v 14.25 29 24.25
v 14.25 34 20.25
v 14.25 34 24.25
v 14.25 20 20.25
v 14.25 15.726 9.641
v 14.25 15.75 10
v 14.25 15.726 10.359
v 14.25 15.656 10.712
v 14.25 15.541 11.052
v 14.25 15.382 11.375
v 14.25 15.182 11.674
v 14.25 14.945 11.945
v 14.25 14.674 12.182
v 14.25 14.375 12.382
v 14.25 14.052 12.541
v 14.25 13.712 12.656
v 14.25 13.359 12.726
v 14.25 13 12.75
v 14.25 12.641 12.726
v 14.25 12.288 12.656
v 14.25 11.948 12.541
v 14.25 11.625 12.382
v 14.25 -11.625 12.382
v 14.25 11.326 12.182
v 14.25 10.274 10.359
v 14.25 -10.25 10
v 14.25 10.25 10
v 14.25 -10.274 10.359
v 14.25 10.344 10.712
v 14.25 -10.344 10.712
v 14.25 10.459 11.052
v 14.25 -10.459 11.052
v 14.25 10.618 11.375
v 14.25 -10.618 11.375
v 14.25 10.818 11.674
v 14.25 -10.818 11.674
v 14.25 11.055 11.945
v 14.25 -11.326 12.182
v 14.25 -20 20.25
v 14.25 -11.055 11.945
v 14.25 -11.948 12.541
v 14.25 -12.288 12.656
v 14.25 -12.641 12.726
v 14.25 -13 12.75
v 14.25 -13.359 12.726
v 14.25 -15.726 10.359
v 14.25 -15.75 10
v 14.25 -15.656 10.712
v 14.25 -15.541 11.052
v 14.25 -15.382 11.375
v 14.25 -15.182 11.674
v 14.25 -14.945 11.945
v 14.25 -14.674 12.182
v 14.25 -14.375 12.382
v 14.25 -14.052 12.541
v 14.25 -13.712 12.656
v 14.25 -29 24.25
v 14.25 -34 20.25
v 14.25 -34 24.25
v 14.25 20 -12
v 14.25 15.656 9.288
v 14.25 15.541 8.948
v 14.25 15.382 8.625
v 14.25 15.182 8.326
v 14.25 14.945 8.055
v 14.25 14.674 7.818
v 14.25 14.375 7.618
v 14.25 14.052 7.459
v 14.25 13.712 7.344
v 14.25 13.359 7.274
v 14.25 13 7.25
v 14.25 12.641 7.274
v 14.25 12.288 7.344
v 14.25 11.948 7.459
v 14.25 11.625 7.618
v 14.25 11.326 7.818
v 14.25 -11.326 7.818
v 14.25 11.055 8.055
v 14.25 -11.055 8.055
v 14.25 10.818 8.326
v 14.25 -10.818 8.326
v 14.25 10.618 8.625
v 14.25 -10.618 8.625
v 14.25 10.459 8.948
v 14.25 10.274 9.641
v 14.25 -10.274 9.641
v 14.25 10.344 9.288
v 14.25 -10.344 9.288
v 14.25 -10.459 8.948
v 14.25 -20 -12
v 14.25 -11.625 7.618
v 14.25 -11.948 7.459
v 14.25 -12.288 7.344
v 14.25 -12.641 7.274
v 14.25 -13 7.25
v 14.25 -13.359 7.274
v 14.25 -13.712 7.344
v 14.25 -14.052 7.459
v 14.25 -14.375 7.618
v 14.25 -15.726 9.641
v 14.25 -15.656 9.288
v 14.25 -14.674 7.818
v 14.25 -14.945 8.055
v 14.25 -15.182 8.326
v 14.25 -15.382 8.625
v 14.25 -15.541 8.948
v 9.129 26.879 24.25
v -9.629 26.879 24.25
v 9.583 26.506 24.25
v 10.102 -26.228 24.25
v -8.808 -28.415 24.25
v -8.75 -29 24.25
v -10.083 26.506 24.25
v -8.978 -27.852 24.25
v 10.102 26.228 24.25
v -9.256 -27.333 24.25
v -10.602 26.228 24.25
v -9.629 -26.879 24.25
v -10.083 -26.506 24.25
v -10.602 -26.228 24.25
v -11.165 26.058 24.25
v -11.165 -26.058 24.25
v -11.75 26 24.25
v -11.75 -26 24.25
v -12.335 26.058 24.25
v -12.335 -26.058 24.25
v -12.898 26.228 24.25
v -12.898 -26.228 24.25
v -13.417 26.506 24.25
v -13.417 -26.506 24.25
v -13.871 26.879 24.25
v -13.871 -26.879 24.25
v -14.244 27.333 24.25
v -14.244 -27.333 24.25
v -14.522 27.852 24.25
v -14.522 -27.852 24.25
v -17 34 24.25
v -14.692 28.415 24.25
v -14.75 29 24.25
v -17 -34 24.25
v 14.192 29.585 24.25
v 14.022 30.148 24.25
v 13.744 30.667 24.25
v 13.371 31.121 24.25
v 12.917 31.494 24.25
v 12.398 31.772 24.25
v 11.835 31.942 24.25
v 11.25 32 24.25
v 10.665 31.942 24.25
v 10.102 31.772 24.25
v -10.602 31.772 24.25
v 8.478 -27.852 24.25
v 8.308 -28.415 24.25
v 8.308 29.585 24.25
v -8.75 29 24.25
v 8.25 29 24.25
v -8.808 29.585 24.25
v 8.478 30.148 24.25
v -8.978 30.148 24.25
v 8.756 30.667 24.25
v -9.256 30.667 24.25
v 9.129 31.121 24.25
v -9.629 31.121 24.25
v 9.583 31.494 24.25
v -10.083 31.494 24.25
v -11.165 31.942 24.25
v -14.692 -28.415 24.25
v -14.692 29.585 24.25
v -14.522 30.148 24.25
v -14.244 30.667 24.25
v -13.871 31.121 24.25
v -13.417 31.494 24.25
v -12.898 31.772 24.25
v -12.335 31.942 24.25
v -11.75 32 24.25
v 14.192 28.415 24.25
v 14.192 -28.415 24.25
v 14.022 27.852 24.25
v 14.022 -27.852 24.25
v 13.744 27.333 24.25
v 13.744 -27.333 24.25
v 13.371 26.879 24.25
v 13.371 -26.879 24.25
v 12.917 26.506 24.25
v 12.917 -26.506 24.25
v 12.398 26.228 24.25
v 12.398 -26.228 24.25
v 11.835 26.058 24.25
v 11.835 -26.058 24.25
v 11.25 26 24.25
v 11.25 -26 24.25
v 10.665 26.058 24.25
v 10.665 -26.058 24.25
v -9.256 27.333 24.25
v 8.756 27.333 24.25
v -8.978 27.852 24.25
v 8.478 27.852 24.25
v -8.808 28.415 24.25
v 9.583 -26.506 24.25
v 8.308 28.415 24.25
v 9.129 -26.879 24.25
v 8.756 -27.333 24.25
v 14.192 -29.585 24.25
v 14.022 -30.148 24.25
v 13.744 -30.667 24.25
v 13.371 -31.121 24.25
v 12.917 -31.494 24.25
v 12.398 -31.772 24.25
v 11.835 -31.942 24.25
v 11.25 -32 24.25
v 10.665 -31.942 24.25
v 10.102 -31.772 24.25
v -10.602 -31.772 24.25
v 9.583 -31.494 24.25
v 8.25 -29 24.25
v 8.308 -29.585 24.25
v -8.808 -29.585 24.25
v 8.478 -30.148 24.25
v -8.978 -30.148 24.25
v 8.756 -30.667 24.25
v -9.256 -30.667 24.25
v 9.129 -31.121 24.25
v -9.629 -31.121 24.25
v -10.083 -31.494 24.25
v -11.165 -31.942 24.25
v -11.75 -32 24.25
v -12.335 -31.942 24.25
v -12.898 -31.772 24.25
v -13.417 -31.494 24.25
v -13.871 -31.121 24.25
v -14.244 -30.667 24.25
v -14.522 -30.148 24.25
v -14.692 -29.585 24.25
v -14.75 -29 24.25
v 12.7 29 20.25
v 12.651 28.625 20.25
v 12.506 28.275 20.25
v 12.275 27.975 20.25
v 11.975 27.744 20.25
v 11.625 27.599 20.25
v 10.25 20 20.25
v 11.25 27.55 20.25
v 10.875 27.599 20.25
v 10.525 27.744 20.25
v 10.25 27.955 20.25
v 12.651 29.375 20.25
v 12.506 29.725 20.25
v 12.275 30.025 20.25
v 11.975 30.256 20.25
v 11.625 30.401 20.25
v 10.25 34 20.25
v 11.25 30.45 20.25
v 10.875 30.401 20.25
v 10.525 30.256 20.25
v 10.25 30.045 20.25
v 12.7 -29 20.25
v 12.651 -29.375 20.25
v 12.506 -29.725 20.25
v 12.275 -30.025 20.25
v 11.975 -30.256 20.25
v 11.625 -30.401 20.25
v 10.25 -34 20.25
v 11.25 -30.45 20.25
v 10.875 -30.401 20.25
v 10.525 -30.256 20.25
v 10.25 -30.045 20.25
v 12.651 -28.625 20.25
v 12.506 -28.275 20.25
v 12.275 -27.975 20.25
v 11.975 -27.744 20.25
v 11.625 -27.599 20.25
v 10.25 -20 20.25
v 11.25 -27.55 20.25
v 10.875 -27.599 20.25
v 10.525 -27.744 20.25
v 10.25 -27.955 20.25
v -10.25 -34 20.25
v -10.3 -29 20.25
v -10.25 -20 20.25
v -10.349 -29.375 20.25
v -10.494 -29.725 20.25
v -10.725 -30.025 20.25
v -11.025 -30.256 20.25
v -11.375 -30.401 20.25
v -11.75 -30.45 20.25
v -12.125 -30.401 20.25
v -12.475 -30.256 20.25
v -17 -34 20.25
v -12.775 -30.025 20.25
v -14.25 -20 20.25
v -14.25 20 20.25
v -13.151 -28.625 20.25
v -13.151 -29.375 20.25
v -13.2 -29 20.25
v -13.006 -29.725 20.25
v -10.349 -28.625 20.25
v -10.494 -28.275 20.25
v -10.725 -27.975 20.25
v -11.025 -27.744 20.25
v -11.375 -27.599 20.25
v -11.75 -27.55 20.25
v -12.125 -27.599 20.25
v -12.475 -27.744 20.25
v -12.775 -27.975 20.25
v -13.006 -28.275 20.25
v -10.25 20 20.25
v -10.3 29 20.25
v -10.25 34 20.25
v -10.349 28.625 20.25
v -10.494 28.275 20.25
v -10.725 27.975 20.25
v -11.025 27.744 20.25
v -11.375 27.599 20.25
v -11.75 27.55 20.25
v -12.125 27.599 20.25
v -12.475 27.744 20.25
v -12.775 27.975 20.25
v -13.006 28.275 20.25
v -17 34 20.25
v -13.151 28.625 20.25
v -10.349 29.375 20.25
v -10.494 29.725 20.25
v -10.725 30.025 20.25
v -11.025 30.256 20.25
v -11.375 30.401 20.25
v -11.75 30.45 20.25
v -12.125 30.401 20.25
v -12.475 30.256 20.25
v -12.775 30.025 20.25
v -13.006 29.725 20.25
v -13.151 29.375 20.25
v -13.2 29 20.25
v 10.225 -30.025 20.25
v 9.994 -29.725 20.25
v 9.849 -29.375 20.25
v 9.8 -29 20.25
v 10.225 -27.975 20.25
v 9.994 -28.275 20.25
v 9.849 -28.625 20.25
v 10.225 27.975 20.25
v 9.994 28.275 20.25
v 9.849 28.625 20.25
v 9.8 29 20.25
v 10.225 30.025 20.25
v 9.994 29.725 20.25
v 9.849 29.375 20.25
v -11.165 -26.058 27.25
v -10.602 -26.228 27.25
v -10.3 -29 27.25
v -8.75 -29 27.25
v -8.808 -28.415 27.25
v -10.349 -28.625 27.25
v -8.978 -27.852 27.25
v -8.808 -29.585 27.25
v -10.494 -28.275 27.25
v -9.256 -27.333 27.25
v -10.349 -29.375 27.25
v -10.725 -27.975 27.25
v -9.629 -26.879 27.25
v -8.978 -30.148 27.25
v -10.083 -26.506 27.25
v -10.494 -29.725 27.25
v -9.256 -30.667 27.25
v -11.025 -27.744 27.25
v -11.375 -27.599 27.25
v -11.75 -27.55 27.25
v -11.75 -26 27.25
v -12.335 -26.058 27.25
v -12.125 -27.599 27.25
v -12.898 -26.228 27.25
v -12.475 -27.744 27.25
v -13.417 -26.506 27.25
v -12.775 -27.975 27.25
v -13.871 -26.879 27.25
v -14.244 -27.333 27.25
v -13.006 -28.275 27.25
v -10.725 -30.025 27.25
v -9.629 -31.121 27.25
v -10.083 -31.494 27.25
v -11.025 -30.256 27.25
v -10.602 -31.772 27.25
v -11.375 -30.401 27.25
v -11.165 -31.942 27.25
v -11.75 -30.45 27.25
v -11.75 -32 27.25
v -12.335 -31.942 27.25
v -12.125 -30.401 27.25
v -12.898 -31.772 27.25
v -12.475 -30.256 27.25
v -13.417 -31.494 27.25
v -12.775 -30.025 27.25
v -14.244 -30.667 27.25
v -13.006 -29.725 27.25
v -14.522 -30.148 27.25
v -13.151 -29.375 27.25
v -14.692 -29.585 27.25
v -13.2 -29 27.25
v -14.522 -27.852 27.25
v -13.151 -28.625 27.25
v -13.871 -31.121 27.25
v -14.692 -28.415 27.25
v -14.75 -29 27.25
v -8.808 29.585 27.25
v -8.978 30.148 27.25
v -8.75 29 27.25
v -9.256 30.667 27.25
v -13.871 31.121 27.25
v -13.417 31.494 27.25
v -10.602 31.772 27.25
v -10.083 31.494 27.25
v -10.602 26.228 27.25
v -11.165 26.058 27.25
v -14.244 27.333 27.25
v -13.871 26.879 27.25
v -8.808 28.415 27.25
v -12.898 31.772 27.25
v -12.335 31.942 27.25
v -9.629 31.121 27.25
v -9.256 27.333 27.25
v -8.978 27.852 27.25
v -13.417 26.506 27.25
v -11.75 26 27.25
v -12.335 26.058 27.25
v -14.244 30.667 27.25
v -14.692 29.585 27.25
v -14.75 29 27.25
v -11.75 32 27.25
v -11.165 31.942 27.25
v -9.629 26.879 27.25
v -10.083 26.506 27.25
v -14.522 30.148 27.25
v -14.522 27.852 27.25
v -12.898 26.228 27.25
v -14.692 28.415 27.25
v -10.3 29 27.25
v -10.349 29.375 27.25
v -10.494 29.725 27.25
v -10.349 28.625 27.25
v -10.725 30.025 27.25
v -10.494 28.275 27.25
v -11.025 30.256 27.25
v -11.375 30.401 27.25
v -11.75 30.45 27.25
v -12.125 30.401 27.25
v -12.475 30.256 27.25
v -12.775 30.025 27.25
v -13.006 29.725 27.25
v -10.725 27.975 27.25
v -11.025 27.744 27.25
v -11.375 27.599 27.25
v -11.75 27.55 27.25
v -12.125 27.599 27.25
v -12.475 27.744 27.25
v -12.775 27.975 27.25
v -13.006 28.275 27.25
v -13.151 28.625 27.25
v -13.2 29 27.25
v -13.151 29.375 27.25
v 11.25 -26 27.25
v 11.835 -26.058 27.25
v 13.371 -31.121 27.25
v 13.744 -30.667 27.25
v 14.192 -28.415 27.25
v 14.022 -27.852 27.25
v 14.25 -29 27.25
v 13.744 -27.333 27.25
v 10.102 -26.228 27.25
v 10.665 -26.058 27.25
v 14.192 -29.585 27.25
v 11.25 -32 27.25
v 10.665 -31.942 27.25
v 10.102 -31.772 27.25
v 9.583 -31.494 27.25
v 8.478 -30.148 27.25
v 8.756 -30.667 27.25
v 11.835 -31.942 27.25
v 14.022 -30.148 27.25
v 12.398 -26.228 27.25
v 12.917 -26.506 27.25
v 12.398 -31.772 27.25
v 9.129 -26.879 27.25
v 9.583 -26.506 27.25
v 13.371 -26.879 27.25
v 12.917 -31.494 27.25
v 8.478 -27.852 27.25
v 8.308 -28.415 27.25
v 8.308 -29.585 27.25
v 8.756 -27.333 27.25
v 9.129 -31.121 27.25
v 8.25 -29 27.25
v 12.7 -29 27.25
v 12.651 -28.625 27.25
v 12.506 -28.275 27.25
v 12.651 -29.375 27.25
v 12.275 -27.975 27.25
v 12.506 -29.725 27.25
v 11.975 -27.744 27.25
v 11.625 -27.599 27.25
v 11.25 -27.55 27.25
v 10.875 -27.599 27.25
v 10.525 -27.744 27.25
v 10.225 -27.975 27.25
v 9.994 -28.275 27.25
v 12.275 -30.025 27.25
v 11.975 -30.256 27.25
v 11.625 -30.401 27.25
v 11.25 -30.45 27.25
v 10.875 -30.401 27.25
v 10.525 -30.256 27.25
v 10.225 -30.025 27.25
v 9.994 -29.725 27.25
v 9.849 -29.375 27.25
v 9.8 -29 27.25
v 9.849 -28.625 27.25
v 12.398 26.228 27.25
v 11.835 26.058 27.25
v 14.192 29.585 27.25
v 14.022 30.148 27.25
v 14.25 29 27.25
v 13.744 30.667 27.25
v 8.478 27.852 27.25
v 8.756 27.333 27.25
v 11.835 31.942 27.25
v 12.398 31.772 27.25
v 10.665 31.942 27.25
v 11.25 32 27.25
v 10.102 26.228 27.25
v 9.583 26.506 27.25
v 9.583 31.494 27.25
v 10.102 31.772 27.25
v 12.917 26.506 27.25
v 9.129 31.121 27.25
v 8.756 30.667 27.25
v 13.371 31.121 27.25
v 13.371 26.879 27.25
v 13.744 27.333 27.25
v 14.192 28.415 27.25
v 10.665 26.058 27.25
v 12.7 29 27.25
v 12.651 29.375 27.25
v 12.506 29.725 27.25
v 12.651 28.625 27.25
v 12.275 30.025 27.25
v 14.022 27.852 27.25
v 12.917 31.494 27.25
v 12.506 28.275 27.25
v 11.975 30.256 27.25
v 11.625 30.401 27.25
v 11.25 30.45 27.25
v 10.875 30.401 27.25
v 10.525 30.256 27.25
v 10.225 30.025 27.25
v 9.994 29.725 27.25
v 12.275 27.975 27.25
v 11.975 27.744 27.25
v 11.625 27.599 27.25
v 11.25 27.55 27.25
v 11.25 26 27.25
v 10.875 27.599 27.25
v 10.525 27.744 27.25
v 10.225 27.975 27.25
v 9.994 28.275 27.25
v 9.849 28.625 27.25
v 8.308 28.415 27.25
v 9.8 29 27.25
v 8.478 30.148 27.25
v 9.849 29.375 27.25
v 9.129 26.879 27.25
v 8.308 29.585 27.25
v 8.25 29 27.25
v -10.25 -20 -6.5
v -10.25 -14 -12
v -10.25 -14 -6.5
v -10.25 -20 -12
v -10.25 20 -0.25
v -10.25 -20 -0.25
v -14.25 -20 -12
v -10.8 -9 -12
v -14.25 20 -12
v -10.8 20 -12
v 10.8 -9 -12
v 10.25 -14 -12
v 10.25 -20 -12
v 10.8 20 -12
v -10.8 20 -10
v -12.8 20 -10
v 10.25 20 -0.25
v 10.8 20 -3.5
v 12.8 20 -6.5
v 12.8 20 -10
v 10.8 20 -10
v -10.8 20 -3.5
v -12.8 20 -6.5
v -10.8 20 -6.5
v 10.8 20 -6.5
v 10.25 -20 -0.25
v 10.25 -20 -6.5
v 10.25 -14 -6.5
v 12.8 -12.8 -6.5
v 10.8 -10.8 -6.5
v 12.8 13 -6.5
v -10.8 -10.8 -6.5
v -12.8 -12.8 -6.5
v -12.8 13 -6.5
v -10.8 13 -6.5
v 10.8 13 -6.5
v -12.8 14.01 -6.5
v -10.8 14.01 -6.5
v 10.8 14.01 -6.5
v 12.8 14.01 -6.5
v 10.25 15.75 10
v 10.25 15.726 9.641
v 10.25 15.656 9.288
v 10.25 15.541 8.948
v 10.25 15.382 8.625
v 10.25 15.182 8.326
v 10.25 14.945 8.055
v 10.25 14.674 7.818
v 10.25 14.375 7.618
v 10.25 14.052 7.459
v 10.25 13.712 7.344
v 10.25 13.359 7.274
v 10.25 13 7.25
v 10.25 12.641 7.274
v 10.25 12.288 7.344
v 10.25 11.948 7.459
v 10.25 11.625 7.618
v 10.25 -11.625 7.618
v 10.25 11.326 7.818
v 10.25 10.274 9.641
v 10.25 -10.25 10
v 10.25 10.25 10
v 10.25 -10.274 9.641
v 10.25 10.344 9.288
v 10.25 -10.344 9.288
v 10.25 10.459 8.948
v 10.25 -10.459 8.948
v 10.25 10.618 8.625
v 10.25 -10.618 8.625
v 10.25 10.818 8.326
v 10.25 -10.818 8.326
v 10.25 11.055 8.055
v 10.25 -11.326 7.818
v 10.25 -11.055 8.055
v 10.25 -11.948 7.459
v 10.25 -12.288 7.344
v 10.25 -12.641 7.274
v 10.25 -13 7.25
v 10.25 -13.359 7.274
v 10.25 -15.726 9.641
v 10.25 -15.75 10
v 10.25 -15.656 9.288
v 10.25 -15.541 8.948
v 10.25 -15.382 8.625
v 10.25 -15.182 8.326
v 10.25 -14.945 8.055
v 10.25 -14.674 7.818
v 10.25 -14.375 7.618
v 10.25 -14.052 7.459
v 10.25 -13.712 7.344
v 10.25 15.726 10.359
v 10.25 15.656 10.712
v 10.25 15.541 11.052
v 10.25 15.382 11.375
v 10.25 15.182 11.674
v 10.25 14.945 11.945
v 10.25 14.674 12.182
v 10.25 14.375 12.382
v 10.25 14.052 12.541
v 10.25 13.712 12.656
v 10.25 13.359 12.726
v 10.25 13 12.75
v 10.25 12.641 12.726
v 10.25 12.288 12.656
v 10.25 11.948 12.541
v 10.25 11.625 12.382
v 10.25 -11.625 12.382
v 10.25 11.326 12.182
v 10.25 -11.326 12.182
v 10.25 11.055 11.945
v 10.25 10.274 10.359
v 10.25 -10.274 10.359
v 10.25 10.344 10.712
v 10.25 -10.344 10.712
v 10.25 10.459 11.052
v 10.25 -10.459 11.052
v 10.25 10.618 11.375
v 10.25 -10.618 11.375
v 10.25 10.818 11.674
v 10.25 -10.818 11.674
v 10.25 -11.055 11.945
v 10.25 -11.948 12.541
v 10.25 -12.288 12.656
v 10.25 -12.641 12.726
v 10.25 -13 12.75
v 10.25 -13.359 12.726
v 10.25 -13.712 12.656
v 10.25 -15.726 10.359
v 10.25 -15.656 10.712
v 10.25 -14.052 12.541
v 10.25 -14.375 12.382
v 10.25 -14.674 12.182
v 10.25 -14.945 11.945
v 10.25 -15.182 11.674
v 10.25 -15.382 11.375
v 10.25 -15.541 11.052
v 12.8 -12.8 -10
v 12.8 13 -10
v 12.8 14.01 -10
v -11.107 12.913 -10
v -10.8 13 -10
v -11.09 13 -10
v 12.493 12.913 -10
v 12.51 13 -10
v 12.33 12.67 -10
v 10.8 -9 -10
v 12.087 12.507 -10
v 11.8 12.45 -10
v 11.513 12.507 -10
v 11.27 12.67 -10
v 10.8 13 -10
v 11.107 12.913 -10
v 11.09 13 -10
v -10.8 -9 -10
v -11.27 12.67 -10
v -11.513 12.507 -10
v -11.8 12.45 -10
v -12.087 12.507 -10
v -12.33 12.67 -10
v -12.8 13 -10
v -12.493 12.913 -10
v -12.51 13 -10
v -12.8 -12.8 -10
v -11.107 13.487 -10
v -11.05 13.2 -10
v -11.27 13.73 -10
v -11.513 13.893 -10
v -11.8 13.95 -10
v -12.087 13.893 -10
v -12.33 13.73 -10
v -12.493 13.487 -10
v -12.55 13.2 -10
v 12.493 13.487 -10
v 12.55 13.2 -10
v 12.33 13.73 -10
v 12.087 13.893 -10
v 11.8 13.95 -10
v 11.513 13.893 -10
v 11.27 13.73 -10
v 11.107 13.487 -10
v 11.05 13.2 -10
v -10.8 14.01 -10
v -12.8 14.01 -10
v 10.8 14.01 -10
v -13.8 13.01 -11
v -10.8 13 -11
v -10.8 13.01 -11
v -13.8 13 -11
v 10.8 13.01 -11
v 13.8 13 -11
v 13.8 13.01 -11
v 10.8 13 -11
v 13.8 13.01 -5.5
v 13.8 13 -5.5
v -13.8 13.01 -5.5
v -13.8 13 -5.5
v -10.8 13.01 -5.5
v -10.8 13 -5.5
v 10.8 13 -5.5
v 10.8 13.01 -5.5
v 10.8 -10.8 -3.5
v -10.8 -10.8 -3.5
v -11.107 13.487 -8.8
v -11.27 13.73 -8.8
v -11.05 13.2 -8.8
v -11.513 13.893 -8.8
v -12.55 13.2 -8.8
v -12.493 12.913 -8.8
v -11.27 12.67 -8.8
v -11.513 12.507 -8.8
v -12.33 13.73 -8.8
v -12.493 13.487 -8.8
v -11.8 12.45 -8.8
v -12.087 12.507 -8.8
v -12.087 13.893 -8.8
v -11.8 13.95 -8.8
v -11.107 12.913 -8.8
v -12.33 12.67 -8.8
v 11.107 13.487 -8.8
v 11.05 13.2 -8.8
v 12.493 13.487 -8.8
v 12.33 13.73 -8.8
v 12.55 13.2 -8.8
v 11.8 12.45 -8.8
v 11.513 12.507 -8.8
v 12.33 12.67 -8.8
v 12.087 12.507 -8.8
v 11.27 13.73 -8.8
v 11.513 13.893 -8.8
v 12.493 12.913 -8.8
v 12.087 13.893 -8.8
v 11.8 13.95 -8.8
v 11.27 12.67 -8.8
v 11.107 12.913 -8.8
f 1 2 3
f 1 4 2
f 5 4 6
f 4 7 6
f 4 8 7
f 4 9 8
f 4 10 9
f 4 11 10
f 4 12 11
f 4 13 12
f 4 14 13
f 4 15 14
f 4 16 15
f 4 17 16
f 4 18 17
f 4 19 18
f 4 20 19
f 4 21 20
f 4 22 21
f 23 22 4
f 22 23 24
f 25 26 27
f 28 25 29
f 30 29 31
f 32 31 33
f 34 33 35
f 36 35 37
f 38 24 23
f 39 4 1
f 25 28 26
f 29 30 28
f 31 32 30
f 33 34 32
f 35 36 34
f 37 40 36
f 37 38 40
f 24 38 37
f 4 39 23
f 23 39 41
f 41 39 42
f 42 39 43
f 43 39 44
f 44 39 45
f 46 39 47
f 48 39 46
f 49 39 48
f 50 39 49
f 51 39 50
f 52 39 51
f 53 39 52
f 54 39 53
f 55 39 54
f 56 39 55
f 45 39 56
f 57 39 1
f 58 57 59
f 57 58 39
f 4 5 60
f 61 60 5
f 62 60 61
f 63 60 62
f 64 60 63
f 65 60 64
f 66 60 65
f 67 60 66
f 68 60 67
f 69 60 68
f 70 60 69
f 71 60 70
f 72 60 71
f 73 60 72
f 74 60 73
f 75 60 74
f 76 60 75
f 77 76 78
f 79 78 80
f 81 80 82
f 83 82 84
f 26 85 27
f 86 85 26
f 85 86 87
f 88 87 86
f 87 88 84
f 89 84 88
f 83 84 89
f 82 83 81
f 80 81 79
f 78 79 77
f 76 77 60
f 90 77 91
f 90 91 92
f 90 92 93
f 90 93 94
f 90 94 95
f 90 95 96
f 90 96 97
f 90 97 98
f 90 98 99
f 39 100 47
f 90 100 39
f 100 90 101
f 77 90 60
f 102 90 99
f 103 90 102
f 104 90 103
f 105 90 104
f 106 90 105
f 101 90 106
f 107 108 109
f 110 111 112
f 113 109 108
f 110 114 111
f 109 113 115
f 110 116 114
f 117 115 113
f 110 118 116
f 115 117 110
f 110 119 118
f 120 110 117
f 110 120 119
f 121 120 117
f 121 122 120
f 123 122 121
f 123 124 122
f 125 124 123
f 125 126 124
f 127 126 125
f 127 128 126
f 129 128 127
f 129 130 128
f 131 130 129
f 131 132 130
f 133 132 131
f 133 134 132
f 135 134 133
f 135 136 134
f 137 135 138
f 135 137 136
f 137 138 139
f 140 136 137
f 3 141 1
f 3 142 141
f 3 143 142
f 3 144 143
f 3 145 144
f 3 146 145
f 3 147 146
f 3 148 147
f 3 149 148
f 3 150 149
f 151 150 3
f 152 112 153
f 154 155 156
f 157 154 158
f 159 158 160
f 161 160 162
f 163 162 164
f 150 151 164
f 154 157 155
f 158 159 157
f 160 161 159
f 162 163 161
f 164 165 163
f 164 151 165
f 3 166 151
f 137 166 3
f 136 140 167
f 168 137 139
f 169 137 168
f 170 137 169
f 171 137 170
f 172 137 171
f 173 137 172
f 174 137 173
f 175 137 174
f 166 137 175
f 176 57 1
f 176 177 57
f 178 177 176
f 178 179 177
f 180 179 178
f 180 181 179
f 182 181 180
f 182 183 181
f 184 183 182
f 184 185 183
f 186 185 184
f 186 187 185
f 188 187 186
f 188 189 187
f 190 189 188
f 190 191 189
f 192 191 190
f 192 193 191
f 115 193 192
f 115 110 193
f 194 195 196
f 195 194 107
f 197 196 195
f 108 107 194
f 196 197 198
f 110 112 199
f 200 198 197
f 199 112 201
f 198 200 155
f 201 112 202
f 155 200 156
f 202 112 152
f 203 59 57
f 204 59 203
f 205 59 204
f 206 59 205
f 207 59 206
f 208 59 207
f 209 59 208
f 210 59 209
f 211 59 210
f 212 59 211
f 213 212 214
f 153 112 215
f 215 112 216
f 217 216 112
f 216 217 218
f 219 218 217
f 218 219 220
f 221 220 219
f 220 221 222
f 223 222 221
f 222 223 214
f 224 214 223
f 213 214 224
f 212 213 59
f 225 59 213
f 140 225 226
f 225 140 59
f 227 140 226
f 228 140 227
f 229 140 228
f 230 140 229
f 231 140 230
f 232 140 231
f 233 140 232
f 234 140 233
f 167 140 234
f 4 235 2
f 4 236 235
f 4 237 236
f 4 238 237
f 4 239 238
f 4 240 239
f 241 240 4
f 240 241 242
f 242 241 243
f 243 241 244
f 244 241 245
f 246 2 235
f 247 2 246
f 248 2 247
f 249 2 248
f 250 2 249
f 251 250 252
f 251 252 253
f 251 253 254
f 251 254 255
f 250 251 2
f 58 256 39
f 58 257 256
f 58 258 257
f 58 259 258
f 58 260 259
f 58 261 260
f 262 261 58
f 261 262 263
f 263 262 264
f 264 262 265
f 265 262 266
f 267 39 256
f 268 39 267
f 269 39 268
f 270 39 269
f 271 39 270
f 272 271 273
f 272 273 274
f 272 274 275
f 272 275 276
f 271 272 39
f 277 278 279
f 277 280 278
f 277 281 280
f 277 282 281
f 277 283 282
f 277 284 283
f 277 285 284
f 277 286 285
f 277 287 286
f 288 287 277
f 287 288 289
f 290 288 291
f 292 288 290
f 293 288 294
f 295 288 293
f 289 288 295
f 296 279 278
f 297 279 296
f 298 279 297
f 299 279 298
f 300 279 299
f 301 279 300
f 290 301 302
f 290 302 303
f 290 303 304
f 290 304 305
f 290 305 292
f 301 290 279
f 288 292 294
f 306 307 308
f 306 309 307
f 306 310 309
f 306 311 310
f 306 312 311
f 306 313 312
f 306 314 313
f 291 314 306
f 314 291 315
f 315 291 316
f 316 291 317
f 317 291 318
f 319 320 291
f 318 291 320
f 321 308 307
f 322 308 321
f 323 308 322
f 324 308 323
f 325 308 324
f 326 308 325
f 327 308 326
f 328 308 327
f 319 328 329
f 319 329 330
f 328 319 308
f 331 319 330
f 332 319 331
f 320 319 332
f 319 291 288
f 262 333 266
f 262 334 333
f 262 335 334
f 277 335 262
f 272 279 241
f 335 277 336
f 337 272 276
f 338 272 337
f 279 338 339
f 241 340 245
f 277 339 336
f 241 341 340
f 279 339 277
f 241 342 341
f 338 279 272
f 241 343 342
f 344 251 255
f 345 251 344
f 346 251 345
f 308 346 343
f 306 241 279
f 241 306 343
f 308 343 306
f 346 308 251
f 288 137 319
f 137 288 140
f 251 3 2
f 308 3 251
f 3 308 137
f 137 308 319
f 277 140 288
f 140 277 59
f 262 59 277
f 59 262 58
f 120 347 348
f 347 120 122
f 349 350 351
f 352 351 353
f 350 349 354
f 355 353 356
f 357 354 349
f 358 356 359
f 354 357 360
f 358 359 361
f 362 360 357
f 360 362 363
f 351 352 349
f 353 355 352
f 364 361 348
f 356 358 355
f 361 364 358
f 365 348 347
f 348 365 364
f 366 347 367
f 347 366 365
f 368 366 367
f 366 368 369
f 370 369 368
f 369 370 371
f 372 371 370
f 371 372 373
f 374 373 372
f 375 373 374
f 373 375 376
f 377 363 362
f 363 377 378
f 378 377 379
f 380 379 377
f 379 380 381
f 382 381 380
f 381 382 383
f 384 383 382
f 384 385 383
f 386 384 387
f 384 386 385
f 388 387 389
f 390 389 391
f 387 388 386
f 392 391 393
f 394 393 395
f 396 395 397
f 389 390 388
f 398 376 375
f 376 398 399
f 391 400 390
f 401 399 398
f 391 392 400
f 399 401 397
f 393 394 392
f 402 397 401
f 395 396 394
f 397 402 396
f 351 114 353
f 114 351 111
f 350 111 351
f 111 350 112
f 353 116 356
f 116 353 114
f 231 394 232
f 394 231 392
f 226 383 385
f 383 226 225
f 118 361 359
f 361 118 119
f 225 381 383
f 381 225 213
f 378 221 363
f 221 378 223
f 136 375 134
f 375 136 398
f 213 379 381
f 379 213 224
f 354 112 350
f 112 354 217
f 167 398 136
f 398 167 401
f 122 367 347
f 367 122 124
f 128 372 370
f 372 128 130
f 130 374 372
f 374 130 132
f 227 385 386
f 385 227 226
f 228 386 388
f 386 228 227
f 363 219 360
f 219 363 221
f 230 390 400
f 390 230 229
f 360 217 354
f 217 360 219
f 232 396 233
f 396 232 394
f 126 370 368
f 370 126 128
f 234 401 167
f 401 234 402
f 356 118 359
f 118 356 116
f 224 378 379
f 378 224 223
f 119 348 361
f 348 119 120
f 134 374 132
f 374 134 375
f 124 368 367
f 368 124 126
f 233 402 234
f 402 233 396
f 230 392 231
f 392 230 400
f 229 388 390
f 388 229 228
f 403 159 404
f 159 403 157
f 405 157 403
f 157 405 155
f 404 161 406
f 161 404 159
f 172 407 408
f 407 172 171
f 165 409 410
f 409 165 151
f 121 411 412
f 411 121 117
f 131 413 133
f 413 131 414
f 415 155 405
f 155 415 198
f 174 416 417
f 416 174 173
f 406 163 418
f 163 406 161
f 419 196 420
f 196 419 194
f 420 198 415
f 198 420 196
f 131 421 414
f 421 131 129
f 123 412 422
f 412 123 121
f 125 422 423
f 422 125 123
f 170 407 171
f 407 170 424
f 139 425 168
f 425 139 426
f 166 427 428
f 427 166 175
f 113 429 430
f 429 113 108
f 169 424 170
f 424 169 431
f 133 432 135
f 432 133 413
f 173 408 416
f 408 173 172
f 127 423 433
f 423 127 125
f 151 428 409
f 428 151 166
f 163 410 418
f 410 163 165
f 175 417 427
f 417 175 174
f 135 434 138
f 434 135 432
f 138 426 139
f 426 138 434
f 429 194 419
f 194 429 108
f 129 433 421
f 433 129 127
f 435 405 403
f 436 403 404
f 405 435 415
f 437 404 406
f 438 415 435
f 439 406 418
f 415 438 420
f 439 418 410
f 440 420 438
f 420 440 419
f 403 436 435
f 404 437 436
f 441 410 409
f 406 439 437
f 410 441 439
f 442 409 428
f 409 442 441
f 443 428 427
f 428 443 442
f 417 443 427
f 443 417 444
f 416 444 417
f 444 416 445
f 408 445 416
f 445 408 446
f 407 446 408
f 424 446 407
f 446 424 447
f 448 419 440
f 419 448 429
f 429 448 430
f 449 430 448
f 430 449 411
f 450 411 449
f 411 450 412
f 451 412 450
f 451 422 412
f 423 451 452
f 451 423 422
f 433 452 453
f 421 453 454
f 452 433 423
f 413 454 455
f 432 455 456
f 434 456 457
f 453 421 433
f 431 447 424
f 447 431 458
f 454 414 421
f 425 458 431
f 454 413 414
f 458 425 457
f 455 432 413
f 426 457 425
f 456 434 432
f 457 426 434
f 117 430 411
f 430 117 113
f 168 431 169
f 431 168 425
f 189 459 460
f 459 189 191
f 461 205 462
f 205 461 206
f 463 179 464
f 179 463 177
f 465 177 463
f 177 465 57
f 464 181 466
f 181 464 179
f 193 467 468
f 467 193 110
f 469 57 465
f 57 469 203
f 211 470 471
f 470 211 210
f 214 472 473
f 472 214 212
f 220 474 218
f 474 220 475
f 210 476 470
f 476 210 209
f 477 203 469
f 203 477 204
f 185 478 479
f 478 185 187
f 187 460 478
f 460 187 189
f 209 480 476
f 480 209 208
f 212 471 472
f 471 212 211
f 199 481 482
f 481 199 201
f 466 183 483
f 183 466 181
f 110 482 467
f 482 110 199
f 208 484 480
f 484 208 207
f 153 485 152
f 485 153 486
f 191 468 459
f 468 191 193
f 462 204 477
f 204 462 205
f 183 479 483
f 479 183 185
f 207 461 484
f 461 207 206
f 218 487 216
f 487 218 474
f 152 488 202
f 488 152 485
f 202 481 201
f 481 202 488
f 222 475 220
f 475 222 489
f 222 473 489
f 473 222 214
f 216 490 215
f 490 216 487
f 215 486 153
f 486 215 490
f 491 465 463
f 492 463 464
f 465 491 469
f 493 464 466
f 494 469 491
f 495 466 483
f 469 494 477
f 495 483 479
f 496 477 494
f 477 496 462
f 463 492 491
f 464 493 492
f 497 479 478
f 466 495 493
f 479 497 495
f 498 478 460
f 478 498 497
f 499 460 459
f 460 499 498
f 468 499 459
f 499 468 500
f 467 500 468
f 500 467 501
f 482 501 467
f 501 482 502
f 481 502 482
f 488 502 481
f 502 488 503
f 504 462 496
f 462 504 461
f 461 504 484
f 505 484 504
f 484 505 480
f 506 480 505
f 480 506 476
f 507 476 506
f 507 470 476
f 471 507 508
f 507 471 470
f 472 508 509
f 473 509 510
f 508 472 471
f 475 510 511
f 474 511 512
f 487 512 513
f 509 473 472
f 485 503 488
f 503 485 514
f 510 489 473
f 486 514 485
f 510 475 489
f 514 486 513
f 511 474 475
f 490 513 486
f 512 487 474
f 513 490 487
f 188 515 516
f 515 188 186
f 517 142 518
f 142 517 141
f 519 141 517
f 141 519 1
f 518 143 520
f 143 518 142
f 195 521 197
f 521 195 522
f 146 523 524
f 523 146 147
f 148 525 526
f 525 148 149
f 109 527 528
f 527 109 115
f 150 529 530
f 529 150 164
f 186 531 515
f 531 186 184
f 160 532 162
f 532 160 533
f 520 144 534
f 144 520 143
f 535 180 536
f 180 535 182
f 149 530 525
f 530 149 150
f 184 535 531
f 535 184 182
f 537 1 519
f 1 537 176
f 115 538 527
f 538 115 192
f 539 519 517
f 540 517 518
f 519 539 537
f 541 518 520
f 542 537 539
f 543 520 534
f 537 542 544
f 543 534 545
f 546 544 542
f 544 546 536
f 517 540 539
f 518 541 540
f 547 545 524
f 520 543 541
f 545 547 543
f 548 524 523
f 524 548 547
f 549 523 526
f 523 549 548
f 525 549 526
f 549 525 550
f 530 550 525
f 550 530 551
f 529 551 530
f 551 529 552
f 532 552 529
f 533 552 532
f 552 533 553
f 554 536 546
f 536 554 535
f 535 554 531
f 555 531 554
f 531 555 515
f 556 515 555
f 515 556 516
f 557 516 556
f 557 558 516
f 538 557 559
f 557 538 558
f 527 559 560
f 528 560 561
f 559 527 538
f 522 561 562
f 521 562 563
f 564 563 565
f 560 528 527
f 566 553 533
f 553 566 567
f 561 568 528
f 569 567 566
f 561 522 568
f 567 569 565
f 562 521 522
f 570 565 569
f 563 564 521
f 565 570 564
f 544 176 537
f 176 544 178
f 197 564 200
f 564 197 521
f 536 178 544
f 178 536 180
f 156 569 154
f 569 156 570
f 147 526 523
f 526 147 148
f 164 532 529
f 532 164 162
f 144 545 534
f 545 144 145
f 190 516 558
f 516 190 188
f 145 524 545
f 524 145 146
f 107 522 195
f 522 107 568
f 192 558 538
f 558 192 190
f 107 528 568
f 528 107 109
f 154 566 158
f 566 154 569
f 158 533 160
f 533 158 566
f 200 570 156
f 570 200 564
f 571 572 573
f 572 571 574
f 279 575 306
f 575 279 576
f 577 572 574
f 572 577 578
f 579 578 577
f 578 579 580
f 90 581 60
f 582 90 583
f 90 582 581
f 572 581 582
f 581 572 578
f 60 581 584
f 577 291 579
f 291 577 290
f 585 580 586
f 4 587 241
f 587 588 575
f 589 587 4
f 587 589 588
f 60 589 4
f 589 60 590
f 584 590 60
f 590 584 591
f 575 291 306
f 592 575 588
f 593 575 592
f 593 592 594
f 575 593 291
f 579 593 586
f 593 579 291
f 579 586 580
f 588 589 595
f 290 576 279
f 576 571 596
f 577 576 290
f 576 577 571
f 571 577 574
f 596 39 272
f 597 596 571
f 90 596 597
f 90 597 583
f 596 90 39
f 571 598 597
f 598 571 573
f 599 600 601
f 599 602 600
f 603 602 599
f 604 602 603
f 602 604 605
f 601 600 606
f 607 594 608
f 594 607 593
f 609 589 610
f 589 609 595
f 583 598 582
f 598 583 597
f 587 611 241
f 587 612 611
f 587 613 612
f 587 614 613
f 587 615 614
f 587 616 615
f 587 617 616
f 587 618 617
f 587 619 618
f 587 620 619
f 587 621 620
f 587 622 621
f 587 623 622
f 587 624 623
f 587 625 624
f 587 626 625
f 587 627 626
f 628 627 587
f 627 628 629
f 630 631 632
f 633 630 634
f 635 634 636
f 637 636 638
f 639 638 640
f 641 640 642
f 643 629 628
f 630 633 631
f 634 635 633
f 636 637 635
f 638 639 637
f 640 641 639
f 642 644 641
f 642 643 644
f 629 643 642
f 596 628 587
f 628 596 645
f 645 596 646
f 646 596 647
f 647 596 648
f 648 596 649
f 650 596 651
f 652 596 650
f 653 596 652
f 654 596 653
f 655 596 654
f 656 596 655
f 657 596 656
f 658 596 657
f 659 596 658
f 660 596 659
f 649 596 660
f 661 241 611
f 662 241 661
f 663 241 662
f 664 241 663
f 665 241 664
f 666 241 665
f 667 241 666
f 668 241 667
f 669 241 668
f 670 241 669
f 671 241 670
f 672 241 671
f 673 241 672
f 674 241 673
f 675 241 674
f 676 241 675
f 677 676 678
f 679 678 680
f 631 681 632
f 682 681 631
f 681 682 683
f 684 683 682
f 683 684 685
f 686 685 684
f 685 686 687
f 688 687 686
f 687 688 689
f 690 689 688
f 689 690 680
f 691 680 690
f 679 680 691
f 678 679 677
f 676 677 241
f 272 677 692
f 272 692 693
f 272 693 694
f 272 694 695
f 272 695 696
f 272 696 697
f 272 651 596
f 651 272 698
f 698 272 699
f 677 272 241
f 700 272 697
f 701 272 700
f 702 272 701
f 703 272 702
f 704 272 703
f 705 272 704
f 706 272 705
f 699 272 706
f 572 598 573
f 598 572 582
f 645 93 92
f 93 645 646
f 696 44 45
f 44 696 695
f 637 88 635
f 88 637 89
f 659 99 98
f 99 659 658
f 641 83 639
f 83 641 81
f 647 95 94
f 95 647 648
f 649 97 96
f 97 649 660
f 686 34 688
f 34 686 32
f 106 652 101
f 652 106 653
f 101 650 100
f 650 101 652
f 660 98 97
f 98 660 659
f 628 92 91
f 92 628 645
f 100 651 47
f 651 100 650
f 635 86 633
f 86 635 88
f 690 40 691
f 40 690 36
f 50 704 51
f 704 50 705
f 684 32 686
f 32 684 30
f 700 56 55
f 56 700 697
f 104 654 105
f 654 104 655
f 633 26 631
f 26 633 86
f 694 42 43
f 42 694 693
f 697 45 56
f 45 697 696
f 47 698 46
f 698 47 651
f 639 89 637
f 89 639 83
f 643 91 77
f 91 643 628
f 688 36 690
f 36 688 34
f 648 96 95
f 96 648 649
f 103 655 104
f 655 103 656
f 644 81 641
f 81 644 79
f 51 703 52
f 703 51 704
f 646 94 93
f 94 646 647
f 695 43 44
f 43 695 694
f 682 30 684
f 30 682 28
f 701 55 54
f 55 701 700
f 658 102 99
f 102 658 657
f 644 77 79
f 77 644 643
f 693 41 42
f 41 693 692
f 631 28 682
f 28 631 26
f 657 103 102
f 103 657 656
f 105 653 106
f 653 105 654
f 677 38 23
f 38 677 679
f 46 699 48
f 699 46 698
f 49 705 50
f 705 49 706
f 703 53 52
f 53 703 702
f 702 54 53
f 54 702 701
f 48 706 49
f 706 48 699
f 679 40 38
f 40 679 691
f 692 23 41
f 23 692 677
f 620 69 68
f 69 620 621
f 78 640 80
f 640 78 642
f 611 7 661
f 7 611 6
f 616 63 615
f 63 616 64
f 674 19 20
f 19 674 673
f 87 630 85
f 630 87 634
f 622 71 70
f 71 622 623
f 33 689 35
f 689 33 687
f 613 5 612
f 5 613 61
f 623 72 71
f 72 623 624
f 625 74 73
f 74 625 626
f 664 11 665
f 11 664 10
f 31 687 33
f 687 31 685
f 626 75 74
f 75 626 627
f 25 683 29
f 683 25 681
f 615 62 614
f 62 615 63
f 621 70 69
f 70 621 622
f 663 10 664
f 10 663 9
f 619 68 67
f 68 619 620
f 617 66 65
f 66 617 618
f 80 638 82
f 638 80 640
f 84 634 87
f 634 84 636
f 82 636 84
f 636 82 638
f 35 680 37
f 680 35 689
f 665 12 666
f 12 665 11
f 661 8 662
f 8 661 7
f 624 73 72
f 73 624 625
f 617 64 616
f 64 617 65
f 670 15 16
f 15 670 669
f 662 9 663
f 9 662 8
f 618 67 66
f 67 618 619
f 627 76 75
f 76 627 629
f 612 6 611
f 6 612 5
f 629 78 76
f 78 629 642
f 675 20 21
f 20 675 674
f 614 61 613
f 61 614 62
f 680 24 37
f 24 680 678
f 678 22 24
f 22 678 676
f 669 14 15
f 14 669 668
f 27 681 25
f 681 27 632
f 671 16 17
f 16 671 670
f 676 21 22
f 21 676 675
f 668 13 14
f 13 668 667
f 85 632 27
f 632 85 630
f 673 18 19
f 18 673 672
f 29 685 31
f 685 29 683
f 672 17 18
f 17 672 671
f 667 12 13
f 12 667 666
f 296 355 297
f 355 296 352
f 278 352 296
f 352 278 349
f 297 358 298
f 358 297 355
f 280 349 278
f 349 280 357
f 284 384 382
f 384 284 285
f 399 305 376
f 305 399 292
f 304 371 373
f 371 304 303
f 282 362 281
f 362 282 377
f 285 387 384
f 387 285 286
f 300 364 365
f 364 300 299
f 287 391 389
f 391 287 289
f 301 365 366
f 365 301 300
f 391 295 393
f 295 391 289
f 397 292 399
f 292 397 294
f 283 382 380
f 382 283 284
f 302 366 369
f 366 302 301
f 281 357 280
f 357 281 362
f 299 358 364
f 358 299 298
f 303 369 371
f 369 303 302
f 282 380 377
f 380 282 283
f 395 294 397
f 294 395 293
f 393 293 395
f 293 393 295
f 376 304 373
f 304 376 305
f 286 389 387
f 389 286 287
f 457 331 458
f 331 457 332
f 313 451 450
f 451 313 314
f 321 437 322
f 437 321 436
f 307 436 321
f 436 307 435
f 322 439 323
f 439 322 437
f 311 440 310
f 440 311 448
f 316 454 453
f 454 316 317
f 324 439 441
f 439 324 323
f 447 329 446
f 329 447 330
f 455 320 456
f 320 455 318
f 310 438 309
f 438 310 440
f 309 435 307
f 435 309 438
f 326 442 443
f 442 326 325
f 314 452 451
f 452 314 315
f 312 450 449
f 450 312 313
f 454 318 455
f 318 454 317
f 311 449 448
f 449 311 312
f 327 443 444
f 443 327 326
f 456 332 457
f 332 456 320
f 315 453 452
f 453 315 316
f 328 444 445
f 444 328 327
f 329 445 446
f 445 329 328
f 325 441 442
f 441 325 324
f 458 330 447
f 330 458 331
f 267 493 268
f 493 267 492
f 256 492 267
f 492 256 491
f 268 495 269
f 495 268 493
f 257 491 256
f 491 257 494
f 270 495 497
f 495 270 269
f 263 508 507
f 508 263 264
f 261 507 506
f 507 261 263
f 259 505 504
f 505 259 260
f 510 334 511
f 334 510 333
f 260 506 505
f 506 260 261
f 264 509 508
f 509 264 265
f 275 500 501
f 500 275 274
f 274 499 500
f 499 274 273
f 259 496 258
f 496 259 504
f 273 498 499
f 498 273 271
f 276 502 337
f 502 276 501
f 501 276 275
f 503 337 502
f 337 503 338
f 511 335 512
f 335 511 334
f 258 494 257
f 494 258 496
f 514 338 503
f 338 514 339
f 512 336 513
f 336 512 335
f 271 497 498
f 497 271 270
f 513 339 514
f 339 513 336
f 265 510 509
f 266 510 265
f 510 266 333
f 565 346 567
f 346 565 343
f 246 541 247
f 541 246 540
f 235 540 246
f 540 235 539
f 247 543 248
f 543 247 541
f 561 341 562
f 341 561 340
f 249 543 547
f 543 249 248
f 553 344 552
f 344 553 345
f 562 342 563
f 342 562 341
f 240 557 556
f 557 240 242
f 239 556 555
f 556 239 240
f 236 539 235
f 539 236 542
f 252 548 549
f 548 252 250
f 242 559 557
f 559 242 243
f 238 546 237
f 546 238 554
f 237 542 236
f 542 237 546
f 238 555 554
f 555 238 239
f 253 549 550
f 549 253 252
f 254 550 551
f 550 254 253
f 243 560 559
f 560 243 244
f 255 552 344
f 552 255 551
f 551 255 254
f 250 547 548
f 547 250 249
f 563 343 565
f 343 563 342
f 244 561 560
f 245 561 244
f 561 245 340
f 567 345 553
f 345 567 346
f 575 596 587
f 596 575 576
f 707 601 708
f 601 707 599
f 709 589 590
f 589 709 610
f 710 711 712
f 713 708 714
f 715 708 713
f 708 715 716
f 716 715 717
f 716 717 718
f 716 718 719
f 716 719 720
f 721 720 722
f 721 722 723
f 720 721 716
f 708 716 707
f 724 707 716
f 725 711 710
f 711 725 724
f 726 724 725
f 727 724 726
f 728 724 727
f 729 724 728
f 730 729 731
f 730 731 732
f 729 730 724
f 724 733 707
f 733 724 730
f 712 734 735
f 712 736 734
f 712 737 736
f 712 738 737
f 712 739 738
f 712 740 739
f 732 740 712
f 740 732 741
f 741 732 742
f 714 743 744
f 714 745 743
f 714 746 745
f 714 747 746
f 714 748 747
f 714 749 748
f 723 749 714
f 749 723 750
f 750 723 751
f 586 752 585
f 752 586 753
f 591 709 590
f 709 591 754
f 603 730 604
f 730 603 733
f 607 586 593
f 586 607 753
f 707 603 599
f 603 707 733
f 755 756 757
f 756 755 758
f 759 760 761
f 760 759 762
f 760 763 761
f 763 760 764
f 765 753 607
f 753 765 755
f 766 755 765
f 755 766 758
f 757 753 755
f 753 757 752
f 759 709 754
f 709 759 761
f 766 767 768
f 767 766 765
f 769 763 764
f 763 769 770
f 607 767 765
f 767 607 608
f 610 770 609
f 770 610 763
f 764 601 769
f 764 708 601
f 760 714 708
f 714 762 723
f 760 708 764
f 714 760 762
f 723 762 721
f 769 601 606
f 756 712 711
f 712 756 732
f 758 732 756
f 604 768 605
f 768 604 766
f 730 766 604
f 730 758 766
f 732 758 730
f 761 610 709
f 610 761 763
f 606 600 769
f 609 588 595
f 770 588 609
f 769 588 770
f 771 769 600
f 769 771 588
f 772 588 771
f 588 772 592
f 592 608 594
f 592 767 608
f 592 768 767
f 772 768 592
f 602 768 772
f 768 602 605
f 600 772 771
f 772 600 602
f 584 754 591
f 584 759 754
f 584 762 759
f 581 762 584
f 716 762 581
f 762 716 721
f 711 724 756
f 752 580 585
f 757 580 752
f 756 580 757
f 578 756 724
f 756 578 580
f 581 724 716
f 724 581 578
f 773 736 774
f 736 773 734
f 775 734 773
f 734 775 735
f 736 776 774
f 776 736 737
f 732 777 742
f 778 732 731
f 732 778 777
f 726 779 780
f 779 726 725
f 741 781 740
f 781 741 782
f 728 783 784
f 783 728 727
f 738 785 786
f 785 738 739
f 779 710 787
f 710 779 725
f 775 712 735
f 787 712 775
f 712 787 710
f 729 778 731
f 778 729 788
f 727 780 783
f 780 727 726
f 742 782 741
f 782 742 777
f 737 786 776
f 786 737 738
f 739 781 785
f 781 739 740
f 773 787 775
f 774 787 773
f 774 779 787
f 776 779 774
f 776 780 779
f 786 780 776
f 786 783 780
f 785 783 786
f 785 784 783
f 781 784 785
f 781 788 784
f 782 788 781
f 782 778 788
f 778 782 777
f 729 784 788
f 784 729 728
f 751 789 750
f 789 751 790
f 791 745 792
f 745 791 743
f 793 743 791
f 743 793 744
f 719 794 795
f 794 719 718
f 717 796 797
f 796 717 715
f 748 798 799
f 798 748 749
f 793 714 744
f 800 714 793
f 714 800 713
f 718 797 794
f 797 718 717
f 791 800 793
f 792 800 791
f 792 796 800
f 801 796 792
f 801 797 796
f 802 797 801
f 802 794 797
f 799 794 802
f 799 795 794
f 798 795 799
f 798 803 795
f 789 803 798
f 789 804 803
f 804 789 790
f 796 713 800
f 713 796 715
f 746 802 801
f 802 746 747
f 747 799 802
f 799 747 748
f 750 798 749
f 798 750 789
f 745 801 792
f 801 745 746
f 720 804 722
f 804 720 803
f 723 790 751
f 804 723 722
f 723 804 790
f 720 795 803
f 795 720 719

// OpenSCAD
// file: common-2020.scad
// Shared socket geometry for the scanner stand brackets.
// A socket holds the end of a 2020 profile running down -Z from its closed end at z=0.

$fn = 48;

profile     = 20;
clearance   = 0.25;   // per side; raise if the profile will not slide in
wall        = 4;
depth       = 30;     // how far a profile slides into a socket
screw_d     = 5.5;
screw_depth = [9, 22];

inner = profile + 2 * clearance;
outer = inner + 2 * wall;
far   = 400;          // long enough to clear anything a hull adds in a profile's path

module socket_body() translate([-outer / 2, -outer / 2, -depth]) cube([outer, outer, depth + wall]);

module socket_void() translate([-inner / 2, -inner / 2, -far]) cube([inner, inner, far]);

// M5 holes through the front and back walls, into T-nuts in the profile's slots.
module socket_screws(depths = screw_depth)
    for (d = depths)
        translate([0, 0, -d]) rotate([90, 0, 0]) cylinder(d = screw_d, h = outer + 2, center = true);
// file: pi-camera-bracket.scad
// One-piece mount for the Pi and the camera on the cross bar of the triangle stand.
// A C that wraps the bar: the Pi Zero screws onto the plate on top, the camera board
// slides into the slot underneath, looking down through the window, on the bar's
// centre line. The open side leaves room for the ribbon cable to run from the camera
// up to the Pi, and lets the mount come off the bar without taking the frame apart.
//
// The boards are held directly, so the cases from thingiverse:2615180 are not needed.
// Board sizes are the published ones for a Pi Zero and a Pi camera module; check them
// against yours, and change pi_holes / cam_board / board_t if they differ.
//
// Hardware: 2x M5x10 button head + 2x M5 T-nuts (slot 6) into the bar's side slot,
// 4x M3x6 self-tapping into the posts for the Pi.
// Print standing on its back, the face with the two M5 holes; PETG, 4+ walls,
// 40% infill, no supports.

include <common-2020.scad>

// Bar runs along Y with its bottom face at z=0. The mount grips its +X side.
back      = inner / 2 + wall;      // outer face of the part against the bar's side
top_z     = profile + clearance;   // underside of the plate over the bar

// Pi Zero: 65 x 30 board, holes 58 x 23 apart; M3 screws go through them.
// pi4-camera-bracket.scad sets these for a Pi 4 and reuses everything else.
pi_board  = [30, 65];
pi_tilt   = 0;                // degrees the Pi leans up toward the open side; see
                              // pi4-camera-bracket-tilted.scad
pi_holes  = [23, 58];
post_h    = 3;
post_d    = 6;
post_hole = 2.9;              // for M3 self-tapping; printed holes come out ~0.3 mm small
// Centre of the holes, across the bar: on the bar's centre line, unless that puts
// a post out past the back face the part stands on to print.
pi_x      = min(0, back - post_d / 2 - pi_holes[0] / 2);
plate     = [[-17, back], [-34, 34]];

// Camera board: 25 x 25 as measured, lens looking down through the window.
// The window runs out to the way in as a channel, so the lens barrel and whatever
// else stands out of the board's underside slide along it instead of hitting the floor.
// The board lies on the floor of the slot under its own weight, so slack above it
// costs nothing but makes it go in.
board     = [25, 25];
cam_board = board + [0.6, 0.6]; // the slot: 0.3 mm of play on each side, so the
                            // board goes in without room to rattle; in along +Y
board_t   = 3.5;            // board, plus what is soldered within reach of the lips
window    = [21.6, 18];     // what the camera looks through, and the channel's width;
                            // what is left either side is the 2 mm ledge the board rests on
lead_in   = 1;              // funnel at the mouth of the slot; at most `rim`
tray_z    = -12;            // underside of the tray
floor_t   = 2;
rim       = 1.2;            // material around the slot, beside it and behind it
lip       = 2;              // how far the lips reach in over the board's edges
bump      = 1.2;            // stops the board sliding back out

// The tray keeps `rim` of wall on the back side too, sitting over if the slot is
// wider than the room between the bar's side and the back of this part. The block
// is then the slot plus a rim each side, which is what makes it 28 mm across.
cam_x     = min(0, -(cam_board[0] / 2 + rim - back));

web_y     = 20;
closed    = false;          // a fourth wall on the open side: a ring the bar has to be
                            // pushed through; see pi-camera-bracket-closed.scad
bar_screws = [-13, 13];

slot_z    = tray_z + floor_t;

module plate() translate([plate[0][0], plate[1][0], top_z])
    cube([plate[0][1] - plate[0][0], plate[1][1] - plate[1][0], wall]);

// What sits on the bar: the plate's width over it, which stays flat however the
// Pi leans.
module roof() translate([-outer / 2, plate[1][0], top_z])
    cube([back + outer / 2, plate[1][1] - plate[1][0], wall]);

// The Pi's plate, leaned up by pi_tilt about its top edge along the back face.
// At no tilt this changes nothing.
module pi_frame() translate([back, 0, top_z + wall]) rotate([0, pi_tilt, 0])
    translate([-back, 0, -(top_z + wall)]) children();

// The leaned plate, and a wedge filling in under it over the bar.
module pi_plate() {
    pi_frame() plate();
    hull() { roof(); pi_frame() roof(); }
}

// Sunk half a millimetre into the plate rather than standing on it: once leaned,
// faces that only touch no longer quite meet, and the union leaves a seam.
module posts() pi_frame() for (x = [-1, 1], y = [-1, 1])
    translate([pi_x + x * pi_holes[0] / 2, y * pi_holes[1] / 2, top_z + wall - 0.5])
        cylinder(d = post_d, h = post_h + 0.5, $fn = 32);

module web() translate([inner / 2, -web_y, tray_z]) cube([wall, 2 * web_y, top_z + wall - tray_z]);

// The same wall on the open side, closing the C into a ring round the bar, and the
// gap under the bar filled down to the camera block, so the bar has the same
// clearance underneath as on its other three sides.
module side_wall() {
    translate([-inner / 2 - wall, -web_y, tray_z])
        cube([wall, 2 * web_y, top_z + wall - tray_z]);
    translate([-inner / 2 - wall, -web_y, tray_z + floor_t + board_t])
        cube([inner + 2 * wall, 2 * web_y, -(tray_z + floor_t + board_t)]);
}

module tray() translate([cam_x - cam_board[0] / 2 - rim, -cam_board[1] / 2 - rim, tray_z])
    cube([cam_board[0] / 2 + rim + back - cam_x, cam_board[1] + 2 * rim,
          floor_t + board_t + lip]);

difference() {
    union() { pi_plate(); posts(); web(); tray(); if (closed) side_wall(); }

    // the bar itself, and the slot the camera board slides into
    // Open on the far side, unless the ring is closed: then only the bar's own size,
    // with clearance underneath as well.
    open_to = closed ? inner / 2 : far;
    below   = closed ? clearance : 0;
    translate([-open_to, -far, -below]) cube([open_to + inner / 2, 2 * far, top_z + below]);
    translate([cam_x - cam_board[0] / 2, -cam_board[1] / 2, slot_z])
        cube([cam_board[0], far, board_t]);
    hull() for (d = [0, lead_in])
        translate([cam_x - cam_board[0] / 2 - d, cam_board[1] / 2 + rim - d, slot_z - d])
            cube([cam_board[0] + 2 * d, 0.01, board_t + 2 * d]);
    // over the board: open, apart from a lip along each side
    translate([cam_x - cam_board[0] / 2 + lip, -cam_board[1] / 2 + lip, slot_z + board_t])
        cube([cam_board[0] - 2 * lip, far, lip + 1]);
    // what the camera looks through
    translate([cam_x - window[0] / 2, -window[1] / 2, tray_z - 1])
        cube([window[0], far, floor_t + 2]);

    for (y = bar_screws) translate([inner / 2 - 1, y, profile / 2]) rotate([0, 90, 0]) cylinder(d = screw_d, h = wall + 2);
    pi_frame() for (x = [-1, 1], y = [-1, 1])
        translate([pi_x + x * pi_holes[0] / 2, y * pi_holes[1] / 2, top_z - 1])
            cylinder(d = post_hole, h = wall + post_h + 2, $fn = 24);
}

// A bump on each ledge, just behind the board's back edge once it is all the way in,
// to keep it from sliding out. The board rides over them on the way in.
for (x = [-1, 1])
    translate([cam_x + x * (cam_board[0] + window[0]) / 4, -cam_board[1] / 2 + board[1] + 1, slot_z])
        cylinder(d = 1.5, h = bump, $fn = 16);   // narrower than the ledge it sits on
// main file
// The Pi Zero mount from pi-camera-bracket.scad, closed into a ring round the bar.
// Instead of clamping onto the bar's side it goes on over the end of the bar, before
// the apex brackets are fitted, and slides along it to the middle.
//
// The ribbon cable leaves the camera slot through its mouth, along the bar, and
// comes up to the Pi past the end of the ring.
//
// Hardware: 4x M3x6 self-tapping for the Pi. The two M5 holes stay: with an M5x10
// and a T-nut in the bar's side slot they stop the ring sliding once it is placed.
// Print standing on its back, the face with the two M5 holes; PETG, 4+ walls,
// 40% infill. The new wall bridges 20 mm over the bar's tunnel, which PETG manages
// without supports.

include <pi-camera-bracket.scad>

closed    = true;
